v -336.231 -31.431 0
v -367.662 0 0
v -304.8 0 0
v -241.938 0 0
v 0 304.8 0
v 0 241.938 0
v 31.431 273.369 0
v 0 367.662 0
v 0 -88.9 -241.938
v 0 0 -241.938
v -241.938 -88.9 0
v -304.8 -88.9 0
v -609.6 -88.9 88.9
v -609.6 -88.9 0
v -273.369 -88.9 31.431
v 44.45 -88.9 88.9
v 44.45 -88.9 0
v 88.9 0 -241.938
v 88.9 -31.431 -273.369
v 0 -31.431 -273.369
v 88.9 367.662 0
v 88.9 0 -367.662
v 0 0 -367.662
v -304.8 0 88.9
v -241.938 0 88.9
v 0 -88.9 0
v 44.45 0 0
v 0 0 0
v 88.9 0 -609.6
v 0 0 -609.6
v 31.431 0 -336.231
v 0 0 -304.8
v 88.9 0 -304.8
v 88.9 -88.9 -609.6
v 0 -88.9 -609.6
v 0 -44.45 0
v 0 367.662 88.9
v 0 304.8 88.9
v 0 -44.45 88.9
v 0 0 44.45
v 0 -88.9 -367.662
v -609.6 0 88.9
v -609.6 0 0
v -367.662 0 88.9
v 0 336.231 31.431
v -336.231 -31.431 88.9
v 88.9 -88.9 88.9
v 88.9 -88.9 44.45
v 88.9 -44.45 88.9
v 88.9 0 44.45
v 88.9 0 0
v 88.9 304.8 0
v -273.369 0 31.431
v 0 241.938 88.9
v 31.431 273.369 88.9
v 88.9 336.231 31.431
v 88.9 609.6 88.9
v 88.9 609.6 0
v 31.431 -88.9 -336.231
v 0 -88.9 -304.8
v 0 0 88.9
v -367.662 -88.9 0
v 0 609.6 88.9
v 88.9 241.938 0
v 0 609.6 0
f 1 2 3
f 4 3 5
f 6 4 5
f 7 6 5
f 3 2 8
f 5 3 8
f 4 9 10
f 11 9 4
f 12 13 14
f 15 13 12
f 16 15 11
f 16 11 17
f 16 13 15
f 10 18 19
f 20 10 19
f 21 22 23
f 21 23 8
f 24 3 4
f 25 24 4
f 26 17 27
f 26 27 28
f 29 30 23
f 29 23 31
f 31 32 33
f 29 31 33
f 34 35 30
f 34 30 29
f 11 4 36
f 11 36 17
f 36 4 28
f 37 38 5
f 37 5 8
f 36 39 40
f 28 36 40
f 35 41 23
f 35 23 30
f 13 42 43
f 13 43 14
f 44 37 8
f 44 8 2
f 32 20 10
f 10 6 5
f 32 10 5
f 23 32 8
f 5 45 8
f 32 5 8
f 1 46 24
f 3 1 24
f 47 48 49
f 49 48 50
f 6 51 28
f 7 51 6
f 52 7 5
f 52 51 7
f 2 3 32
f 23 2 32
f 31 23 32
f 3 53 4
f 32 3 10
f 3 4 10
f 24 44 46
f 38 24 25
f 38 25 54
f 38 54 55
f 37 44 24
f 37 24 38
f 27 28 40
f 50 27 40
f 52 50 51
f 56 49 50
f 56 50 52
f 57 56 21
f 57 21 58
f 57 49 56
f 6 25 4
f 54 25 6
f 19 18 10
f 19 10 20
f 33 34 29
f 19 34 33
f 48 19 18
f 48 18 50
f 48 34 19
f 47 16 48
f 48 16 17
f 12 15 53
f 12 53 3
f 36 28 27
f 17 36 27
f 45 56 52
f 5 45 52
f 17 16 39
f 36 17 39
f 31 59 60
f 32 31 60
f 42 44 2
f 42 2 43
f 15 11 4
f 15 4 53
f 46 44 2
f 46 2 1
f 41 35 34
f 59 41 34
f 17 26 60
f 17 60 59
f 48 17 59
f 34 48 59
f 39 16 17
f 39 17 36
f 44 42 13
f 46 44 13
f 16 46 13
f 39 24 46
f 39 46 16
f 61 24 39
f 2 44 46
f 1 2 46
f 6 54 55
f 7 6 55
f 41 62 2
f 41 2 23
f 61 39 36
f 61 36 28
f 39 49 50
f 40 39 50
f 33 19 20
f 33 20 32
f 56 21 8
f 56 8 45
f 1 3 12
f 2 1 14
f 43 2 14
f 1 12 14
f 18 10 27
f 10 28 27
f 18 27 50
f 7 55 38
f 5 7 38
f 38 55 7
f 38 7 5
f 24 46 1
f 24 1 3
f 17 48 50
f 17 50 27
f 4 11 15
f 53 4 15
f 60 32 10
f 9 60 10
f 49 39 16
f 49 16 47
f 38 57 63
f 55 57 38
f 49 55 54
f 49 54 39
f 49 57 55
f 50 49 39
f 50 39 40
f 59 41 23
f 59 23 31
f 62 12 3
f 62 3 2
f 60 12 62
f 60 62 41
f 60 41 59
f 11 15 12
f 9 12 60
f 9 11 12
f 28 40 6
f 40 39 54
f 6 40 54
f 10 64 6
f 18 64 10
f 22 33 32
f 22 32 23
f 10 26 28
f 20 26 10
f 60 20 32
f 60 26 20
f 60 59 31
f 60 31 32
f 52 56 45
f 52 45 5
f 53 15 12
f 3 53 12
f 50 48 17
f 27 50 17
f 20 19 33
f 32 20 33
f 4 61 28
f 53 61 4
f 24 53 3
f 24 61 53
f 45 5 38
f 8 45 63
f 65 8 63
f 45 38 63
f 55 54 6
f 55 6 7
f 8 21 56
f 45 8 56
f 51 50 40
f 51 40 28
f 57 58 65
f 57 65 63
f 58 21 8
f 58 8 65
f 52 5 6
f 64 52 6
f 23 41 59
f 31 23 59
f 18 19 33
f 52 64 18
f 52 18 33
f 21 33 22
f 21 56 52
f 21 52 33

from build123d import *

# Parameters (mm, degrees)
F0_W      = 88.9
F0_H      = 88.9
F1_DEPTH  = 88.9
F5_DEPTH  = 88.9
F6_DEPTH  = 88.9
F7_DEPTH  = 88.9
F12_DEPTH = 88.9
F13_DEPTH = 88.9
F14_DEPTH = 88.9


with BuildPart() as f1:
    # F0 (on Top) → F1 (new body)
    with BuildSketch(Plane.XY):
        with Locations((44.45, -44.45)):
            Rectangle(F0_W, F0_H)
    extrude(amount=F1_DEPTH)


with BuildPart() as f5:
    # F2 (on face) → F5 (new body)
    with BuildSketch(Plane.XY.offset(88.9)):
        Polygon((44.45, -88.9), (0, -44.45), (0, -88.9), align=None)
        Polygon((0, -88.9), (0, -44.45), (0, 0), (-609.6, 0), (-609.6, -88.9), align=None)
    extrude(amount=-F5_DEPTH)


with BuildPart() as f6:
    # F3 (on face) → F6 (new body)
    with BuildSketch(Plane.XZ.offset(88.9)):
        Polygon((88.9, 44.45), (44.45, 0), (88.9, 0), align=None)
        Polygon((88.9, 0), (44.45, 0), (0, 0), (0, -609.6), (88.9, -609.6), align=None)
    extrude(amount=-F6_DEPTH)


with BuildPart() as f7:
    # F4 (on face) → F7 (new body)
    with BuildSketch(Plane.YZ.offset(88.9)):
        Polygon((-44.45, 88.9), (0, 44.45), (0, 88.9), align=None)
        Polygon((0, 88.9), (0, 44.45), (0, 0), (609.6, 0), (609.6, 88.9), align=None)
    extrude(amount=-F7_DEPTH)


with BuildPart() as f1_1:
    add(f1.part)

    # F8: cut F5, F7, F6
    add(f5.part, mode=Mode.SUBTRACT)
    add(f7.part, mode=Mode.SUBTRACT)
    add(f6.part, mode=Mode.SUBTRACT)


with BuildPart() as f12:
    # F9 (on face) → F12 (new body)
    with BuildSketch(Plane.XY.offset(88.9)):
        Polygon((-304.8, 0), (-241.9382071525, 0), (0, 241.9382071525), (31.4308964237, 273.3691035763), (0, 304.8), (0, 367.6617928475), (-367.6617928475, 0), (-336.2308964237, -31.4308964237), align=None)
    extrude(amount=-F12_DEPTH)


with BuildPart() as f13:
    # F10 (on face) → F13 (new body)
    with BuildSketch(Plane.XZ.offset(88.9)):
        Polygon((0, -304.8), (0, -241.9382071525), (-241.9382071525, 0), (-304.8, 0), (-367.6617928475, 0), (0, -367.6617928475), (31.4308964237, -336.2308964237), align=None)
        Polygon((-304.8, 0), (-241.9382071525, 0), (-273.3691035763, 31.4308964237), align=None)
    extrude(amount=-F13_DEPTH)


with BuildPart() as f14:
    # F11 (on face) → F14 (new body)
    with BuildSketch(Plane.YZ.offset(88.9)):
        Polygon((241.9382071525, 0), (0, -241.9382071525), (0, -304.8), (0, -367.6617928475), (367.6617928475, 0), (336.2308964237, 31.4308964237), (304.8, 0), align=None)
        Polygon((0, -304.8), (0, -241.9382071525), (-31.4308964237, -273.3691035763), align=None)
    extrude(amount=-F14_DEPTH)


with BuildPart() as f6_1:
    add(f6.part)

    # F15: cut F13, F12, F14
    add(f13.part, mode=Mode.SUBTRACT)
    add(f12.part, mode=Mode.SUBTRACT)
    add(f14.part, mode=Mode.SUBTRACT)


with BuildPart() as f5_1:
    add(f5.part)

    # F15: cut F13, F12, F14
    add(f13.part, mode=Mode.SUBTRACT)
    add(f12.part, mode=Mode.SUBTRACT)
    add(f14.part, mode=Mode.SUBTRACT)


with BuildPart() as f7_1:
    add(f7.part)

    # F15: cut F13, F12, F14
    add(f13.part, mode=Mode.SUBTRACT)
    add(f12.part, mode=Mode.SUBTRACT)
    add(f14.part, mode=Mode.SUBTRACT)


solid = Compound([f1_1.part, f12.part, f13.part, f14.part, f6_1.part, f5_1.part, f7_1.part])
